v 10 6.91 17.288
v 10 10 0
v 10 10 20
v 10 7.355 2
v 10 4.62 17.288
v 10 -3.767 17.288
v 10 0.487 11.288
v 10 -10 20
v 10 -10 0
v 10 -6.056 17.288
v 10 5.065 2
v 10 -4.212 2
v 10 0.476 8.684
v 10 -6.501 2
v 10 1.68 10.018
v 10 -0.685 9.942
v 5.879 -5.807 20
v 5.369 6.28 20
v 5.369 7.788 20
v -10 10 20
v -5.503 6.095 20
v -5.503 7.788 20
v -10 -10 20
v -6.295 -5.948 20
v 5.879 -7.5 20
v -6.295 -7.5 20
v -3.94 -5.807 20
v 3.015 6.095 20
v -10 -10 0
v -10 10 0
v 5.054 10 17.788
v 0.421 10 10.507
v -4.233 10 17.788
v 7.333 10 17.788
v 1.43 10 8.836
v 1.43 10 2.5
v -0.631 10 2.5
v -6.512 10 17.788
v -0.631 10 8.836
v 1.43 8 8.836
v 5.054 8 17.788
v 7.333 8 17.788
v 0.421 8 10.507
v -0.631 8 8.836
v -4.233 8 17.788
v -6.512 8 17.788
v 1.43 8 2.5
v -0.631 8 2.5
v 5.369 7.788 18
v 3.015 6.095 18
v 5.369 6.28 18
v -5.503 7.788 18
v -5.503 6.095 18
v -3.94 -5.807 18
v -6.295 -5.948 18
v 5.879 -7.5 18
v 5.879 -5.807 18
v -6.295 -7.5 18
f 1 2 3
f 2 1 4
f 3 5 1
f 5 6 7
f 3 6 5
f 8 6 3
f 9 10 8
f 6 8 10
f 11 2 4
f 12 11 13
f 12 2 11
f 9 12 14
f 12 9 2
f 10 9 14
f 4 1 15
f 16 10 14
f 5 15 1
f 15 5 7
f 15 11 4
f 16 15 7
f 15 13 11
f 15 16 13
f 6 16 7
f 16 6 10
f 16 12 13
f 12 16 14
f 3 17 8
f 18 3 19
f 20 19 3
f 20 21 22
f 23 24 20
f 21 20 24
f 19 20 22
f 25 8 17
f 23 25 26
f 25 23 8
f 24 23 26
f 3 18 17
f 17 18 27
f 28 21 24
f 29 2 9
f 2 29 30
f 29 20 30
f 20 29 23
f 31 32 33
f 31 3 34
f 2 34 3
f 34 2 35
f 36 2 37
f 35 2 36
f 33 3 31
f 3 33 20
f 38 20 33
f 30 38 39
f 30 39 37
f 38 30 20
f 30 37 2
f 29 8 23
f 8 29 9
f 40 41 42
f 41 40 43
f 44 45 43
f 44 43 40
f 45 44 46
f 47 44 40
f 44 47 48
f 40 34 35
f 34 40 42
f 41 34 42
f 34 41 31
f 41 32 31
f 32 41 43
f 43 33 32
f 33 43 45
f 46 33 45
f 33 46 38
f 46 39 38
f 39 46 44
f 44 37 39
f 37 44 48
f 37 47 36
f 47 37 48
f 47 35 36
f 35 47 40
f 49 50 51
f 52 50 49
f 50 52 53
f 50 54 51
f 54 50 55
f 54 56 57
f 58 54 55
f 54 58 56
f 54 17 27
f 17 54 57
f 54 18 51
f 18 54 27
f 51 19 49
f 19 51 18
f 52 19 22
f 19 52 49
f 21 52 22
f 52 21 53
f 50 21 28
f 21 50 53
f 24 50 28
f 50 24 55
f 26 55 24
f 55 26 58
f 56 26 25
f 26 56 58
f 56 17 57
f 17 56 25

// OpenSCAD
difference(){
	translate([-10, -10, 0]) {
		cube(20);
	}

	// rotate([])
	translate([10,-7, 2]) {
		rotate([90, 0, 90]) {
			linear_extrude(height=2) {
				text("X", size=16);
			}
		}
	}
	translate([-7, 10, 2.5]) {
		rotate([90, 0, 0]) {
			linear_extrude(height=2) {
				text("Y", size=16);
			}
		}
	}
	translate([-7, -7.5, 18]) {
		rotate([0, 0, 0]) {
			linear_extrude(height=2) {
				text("Z", size=16);
			}
		}
	} 
}
